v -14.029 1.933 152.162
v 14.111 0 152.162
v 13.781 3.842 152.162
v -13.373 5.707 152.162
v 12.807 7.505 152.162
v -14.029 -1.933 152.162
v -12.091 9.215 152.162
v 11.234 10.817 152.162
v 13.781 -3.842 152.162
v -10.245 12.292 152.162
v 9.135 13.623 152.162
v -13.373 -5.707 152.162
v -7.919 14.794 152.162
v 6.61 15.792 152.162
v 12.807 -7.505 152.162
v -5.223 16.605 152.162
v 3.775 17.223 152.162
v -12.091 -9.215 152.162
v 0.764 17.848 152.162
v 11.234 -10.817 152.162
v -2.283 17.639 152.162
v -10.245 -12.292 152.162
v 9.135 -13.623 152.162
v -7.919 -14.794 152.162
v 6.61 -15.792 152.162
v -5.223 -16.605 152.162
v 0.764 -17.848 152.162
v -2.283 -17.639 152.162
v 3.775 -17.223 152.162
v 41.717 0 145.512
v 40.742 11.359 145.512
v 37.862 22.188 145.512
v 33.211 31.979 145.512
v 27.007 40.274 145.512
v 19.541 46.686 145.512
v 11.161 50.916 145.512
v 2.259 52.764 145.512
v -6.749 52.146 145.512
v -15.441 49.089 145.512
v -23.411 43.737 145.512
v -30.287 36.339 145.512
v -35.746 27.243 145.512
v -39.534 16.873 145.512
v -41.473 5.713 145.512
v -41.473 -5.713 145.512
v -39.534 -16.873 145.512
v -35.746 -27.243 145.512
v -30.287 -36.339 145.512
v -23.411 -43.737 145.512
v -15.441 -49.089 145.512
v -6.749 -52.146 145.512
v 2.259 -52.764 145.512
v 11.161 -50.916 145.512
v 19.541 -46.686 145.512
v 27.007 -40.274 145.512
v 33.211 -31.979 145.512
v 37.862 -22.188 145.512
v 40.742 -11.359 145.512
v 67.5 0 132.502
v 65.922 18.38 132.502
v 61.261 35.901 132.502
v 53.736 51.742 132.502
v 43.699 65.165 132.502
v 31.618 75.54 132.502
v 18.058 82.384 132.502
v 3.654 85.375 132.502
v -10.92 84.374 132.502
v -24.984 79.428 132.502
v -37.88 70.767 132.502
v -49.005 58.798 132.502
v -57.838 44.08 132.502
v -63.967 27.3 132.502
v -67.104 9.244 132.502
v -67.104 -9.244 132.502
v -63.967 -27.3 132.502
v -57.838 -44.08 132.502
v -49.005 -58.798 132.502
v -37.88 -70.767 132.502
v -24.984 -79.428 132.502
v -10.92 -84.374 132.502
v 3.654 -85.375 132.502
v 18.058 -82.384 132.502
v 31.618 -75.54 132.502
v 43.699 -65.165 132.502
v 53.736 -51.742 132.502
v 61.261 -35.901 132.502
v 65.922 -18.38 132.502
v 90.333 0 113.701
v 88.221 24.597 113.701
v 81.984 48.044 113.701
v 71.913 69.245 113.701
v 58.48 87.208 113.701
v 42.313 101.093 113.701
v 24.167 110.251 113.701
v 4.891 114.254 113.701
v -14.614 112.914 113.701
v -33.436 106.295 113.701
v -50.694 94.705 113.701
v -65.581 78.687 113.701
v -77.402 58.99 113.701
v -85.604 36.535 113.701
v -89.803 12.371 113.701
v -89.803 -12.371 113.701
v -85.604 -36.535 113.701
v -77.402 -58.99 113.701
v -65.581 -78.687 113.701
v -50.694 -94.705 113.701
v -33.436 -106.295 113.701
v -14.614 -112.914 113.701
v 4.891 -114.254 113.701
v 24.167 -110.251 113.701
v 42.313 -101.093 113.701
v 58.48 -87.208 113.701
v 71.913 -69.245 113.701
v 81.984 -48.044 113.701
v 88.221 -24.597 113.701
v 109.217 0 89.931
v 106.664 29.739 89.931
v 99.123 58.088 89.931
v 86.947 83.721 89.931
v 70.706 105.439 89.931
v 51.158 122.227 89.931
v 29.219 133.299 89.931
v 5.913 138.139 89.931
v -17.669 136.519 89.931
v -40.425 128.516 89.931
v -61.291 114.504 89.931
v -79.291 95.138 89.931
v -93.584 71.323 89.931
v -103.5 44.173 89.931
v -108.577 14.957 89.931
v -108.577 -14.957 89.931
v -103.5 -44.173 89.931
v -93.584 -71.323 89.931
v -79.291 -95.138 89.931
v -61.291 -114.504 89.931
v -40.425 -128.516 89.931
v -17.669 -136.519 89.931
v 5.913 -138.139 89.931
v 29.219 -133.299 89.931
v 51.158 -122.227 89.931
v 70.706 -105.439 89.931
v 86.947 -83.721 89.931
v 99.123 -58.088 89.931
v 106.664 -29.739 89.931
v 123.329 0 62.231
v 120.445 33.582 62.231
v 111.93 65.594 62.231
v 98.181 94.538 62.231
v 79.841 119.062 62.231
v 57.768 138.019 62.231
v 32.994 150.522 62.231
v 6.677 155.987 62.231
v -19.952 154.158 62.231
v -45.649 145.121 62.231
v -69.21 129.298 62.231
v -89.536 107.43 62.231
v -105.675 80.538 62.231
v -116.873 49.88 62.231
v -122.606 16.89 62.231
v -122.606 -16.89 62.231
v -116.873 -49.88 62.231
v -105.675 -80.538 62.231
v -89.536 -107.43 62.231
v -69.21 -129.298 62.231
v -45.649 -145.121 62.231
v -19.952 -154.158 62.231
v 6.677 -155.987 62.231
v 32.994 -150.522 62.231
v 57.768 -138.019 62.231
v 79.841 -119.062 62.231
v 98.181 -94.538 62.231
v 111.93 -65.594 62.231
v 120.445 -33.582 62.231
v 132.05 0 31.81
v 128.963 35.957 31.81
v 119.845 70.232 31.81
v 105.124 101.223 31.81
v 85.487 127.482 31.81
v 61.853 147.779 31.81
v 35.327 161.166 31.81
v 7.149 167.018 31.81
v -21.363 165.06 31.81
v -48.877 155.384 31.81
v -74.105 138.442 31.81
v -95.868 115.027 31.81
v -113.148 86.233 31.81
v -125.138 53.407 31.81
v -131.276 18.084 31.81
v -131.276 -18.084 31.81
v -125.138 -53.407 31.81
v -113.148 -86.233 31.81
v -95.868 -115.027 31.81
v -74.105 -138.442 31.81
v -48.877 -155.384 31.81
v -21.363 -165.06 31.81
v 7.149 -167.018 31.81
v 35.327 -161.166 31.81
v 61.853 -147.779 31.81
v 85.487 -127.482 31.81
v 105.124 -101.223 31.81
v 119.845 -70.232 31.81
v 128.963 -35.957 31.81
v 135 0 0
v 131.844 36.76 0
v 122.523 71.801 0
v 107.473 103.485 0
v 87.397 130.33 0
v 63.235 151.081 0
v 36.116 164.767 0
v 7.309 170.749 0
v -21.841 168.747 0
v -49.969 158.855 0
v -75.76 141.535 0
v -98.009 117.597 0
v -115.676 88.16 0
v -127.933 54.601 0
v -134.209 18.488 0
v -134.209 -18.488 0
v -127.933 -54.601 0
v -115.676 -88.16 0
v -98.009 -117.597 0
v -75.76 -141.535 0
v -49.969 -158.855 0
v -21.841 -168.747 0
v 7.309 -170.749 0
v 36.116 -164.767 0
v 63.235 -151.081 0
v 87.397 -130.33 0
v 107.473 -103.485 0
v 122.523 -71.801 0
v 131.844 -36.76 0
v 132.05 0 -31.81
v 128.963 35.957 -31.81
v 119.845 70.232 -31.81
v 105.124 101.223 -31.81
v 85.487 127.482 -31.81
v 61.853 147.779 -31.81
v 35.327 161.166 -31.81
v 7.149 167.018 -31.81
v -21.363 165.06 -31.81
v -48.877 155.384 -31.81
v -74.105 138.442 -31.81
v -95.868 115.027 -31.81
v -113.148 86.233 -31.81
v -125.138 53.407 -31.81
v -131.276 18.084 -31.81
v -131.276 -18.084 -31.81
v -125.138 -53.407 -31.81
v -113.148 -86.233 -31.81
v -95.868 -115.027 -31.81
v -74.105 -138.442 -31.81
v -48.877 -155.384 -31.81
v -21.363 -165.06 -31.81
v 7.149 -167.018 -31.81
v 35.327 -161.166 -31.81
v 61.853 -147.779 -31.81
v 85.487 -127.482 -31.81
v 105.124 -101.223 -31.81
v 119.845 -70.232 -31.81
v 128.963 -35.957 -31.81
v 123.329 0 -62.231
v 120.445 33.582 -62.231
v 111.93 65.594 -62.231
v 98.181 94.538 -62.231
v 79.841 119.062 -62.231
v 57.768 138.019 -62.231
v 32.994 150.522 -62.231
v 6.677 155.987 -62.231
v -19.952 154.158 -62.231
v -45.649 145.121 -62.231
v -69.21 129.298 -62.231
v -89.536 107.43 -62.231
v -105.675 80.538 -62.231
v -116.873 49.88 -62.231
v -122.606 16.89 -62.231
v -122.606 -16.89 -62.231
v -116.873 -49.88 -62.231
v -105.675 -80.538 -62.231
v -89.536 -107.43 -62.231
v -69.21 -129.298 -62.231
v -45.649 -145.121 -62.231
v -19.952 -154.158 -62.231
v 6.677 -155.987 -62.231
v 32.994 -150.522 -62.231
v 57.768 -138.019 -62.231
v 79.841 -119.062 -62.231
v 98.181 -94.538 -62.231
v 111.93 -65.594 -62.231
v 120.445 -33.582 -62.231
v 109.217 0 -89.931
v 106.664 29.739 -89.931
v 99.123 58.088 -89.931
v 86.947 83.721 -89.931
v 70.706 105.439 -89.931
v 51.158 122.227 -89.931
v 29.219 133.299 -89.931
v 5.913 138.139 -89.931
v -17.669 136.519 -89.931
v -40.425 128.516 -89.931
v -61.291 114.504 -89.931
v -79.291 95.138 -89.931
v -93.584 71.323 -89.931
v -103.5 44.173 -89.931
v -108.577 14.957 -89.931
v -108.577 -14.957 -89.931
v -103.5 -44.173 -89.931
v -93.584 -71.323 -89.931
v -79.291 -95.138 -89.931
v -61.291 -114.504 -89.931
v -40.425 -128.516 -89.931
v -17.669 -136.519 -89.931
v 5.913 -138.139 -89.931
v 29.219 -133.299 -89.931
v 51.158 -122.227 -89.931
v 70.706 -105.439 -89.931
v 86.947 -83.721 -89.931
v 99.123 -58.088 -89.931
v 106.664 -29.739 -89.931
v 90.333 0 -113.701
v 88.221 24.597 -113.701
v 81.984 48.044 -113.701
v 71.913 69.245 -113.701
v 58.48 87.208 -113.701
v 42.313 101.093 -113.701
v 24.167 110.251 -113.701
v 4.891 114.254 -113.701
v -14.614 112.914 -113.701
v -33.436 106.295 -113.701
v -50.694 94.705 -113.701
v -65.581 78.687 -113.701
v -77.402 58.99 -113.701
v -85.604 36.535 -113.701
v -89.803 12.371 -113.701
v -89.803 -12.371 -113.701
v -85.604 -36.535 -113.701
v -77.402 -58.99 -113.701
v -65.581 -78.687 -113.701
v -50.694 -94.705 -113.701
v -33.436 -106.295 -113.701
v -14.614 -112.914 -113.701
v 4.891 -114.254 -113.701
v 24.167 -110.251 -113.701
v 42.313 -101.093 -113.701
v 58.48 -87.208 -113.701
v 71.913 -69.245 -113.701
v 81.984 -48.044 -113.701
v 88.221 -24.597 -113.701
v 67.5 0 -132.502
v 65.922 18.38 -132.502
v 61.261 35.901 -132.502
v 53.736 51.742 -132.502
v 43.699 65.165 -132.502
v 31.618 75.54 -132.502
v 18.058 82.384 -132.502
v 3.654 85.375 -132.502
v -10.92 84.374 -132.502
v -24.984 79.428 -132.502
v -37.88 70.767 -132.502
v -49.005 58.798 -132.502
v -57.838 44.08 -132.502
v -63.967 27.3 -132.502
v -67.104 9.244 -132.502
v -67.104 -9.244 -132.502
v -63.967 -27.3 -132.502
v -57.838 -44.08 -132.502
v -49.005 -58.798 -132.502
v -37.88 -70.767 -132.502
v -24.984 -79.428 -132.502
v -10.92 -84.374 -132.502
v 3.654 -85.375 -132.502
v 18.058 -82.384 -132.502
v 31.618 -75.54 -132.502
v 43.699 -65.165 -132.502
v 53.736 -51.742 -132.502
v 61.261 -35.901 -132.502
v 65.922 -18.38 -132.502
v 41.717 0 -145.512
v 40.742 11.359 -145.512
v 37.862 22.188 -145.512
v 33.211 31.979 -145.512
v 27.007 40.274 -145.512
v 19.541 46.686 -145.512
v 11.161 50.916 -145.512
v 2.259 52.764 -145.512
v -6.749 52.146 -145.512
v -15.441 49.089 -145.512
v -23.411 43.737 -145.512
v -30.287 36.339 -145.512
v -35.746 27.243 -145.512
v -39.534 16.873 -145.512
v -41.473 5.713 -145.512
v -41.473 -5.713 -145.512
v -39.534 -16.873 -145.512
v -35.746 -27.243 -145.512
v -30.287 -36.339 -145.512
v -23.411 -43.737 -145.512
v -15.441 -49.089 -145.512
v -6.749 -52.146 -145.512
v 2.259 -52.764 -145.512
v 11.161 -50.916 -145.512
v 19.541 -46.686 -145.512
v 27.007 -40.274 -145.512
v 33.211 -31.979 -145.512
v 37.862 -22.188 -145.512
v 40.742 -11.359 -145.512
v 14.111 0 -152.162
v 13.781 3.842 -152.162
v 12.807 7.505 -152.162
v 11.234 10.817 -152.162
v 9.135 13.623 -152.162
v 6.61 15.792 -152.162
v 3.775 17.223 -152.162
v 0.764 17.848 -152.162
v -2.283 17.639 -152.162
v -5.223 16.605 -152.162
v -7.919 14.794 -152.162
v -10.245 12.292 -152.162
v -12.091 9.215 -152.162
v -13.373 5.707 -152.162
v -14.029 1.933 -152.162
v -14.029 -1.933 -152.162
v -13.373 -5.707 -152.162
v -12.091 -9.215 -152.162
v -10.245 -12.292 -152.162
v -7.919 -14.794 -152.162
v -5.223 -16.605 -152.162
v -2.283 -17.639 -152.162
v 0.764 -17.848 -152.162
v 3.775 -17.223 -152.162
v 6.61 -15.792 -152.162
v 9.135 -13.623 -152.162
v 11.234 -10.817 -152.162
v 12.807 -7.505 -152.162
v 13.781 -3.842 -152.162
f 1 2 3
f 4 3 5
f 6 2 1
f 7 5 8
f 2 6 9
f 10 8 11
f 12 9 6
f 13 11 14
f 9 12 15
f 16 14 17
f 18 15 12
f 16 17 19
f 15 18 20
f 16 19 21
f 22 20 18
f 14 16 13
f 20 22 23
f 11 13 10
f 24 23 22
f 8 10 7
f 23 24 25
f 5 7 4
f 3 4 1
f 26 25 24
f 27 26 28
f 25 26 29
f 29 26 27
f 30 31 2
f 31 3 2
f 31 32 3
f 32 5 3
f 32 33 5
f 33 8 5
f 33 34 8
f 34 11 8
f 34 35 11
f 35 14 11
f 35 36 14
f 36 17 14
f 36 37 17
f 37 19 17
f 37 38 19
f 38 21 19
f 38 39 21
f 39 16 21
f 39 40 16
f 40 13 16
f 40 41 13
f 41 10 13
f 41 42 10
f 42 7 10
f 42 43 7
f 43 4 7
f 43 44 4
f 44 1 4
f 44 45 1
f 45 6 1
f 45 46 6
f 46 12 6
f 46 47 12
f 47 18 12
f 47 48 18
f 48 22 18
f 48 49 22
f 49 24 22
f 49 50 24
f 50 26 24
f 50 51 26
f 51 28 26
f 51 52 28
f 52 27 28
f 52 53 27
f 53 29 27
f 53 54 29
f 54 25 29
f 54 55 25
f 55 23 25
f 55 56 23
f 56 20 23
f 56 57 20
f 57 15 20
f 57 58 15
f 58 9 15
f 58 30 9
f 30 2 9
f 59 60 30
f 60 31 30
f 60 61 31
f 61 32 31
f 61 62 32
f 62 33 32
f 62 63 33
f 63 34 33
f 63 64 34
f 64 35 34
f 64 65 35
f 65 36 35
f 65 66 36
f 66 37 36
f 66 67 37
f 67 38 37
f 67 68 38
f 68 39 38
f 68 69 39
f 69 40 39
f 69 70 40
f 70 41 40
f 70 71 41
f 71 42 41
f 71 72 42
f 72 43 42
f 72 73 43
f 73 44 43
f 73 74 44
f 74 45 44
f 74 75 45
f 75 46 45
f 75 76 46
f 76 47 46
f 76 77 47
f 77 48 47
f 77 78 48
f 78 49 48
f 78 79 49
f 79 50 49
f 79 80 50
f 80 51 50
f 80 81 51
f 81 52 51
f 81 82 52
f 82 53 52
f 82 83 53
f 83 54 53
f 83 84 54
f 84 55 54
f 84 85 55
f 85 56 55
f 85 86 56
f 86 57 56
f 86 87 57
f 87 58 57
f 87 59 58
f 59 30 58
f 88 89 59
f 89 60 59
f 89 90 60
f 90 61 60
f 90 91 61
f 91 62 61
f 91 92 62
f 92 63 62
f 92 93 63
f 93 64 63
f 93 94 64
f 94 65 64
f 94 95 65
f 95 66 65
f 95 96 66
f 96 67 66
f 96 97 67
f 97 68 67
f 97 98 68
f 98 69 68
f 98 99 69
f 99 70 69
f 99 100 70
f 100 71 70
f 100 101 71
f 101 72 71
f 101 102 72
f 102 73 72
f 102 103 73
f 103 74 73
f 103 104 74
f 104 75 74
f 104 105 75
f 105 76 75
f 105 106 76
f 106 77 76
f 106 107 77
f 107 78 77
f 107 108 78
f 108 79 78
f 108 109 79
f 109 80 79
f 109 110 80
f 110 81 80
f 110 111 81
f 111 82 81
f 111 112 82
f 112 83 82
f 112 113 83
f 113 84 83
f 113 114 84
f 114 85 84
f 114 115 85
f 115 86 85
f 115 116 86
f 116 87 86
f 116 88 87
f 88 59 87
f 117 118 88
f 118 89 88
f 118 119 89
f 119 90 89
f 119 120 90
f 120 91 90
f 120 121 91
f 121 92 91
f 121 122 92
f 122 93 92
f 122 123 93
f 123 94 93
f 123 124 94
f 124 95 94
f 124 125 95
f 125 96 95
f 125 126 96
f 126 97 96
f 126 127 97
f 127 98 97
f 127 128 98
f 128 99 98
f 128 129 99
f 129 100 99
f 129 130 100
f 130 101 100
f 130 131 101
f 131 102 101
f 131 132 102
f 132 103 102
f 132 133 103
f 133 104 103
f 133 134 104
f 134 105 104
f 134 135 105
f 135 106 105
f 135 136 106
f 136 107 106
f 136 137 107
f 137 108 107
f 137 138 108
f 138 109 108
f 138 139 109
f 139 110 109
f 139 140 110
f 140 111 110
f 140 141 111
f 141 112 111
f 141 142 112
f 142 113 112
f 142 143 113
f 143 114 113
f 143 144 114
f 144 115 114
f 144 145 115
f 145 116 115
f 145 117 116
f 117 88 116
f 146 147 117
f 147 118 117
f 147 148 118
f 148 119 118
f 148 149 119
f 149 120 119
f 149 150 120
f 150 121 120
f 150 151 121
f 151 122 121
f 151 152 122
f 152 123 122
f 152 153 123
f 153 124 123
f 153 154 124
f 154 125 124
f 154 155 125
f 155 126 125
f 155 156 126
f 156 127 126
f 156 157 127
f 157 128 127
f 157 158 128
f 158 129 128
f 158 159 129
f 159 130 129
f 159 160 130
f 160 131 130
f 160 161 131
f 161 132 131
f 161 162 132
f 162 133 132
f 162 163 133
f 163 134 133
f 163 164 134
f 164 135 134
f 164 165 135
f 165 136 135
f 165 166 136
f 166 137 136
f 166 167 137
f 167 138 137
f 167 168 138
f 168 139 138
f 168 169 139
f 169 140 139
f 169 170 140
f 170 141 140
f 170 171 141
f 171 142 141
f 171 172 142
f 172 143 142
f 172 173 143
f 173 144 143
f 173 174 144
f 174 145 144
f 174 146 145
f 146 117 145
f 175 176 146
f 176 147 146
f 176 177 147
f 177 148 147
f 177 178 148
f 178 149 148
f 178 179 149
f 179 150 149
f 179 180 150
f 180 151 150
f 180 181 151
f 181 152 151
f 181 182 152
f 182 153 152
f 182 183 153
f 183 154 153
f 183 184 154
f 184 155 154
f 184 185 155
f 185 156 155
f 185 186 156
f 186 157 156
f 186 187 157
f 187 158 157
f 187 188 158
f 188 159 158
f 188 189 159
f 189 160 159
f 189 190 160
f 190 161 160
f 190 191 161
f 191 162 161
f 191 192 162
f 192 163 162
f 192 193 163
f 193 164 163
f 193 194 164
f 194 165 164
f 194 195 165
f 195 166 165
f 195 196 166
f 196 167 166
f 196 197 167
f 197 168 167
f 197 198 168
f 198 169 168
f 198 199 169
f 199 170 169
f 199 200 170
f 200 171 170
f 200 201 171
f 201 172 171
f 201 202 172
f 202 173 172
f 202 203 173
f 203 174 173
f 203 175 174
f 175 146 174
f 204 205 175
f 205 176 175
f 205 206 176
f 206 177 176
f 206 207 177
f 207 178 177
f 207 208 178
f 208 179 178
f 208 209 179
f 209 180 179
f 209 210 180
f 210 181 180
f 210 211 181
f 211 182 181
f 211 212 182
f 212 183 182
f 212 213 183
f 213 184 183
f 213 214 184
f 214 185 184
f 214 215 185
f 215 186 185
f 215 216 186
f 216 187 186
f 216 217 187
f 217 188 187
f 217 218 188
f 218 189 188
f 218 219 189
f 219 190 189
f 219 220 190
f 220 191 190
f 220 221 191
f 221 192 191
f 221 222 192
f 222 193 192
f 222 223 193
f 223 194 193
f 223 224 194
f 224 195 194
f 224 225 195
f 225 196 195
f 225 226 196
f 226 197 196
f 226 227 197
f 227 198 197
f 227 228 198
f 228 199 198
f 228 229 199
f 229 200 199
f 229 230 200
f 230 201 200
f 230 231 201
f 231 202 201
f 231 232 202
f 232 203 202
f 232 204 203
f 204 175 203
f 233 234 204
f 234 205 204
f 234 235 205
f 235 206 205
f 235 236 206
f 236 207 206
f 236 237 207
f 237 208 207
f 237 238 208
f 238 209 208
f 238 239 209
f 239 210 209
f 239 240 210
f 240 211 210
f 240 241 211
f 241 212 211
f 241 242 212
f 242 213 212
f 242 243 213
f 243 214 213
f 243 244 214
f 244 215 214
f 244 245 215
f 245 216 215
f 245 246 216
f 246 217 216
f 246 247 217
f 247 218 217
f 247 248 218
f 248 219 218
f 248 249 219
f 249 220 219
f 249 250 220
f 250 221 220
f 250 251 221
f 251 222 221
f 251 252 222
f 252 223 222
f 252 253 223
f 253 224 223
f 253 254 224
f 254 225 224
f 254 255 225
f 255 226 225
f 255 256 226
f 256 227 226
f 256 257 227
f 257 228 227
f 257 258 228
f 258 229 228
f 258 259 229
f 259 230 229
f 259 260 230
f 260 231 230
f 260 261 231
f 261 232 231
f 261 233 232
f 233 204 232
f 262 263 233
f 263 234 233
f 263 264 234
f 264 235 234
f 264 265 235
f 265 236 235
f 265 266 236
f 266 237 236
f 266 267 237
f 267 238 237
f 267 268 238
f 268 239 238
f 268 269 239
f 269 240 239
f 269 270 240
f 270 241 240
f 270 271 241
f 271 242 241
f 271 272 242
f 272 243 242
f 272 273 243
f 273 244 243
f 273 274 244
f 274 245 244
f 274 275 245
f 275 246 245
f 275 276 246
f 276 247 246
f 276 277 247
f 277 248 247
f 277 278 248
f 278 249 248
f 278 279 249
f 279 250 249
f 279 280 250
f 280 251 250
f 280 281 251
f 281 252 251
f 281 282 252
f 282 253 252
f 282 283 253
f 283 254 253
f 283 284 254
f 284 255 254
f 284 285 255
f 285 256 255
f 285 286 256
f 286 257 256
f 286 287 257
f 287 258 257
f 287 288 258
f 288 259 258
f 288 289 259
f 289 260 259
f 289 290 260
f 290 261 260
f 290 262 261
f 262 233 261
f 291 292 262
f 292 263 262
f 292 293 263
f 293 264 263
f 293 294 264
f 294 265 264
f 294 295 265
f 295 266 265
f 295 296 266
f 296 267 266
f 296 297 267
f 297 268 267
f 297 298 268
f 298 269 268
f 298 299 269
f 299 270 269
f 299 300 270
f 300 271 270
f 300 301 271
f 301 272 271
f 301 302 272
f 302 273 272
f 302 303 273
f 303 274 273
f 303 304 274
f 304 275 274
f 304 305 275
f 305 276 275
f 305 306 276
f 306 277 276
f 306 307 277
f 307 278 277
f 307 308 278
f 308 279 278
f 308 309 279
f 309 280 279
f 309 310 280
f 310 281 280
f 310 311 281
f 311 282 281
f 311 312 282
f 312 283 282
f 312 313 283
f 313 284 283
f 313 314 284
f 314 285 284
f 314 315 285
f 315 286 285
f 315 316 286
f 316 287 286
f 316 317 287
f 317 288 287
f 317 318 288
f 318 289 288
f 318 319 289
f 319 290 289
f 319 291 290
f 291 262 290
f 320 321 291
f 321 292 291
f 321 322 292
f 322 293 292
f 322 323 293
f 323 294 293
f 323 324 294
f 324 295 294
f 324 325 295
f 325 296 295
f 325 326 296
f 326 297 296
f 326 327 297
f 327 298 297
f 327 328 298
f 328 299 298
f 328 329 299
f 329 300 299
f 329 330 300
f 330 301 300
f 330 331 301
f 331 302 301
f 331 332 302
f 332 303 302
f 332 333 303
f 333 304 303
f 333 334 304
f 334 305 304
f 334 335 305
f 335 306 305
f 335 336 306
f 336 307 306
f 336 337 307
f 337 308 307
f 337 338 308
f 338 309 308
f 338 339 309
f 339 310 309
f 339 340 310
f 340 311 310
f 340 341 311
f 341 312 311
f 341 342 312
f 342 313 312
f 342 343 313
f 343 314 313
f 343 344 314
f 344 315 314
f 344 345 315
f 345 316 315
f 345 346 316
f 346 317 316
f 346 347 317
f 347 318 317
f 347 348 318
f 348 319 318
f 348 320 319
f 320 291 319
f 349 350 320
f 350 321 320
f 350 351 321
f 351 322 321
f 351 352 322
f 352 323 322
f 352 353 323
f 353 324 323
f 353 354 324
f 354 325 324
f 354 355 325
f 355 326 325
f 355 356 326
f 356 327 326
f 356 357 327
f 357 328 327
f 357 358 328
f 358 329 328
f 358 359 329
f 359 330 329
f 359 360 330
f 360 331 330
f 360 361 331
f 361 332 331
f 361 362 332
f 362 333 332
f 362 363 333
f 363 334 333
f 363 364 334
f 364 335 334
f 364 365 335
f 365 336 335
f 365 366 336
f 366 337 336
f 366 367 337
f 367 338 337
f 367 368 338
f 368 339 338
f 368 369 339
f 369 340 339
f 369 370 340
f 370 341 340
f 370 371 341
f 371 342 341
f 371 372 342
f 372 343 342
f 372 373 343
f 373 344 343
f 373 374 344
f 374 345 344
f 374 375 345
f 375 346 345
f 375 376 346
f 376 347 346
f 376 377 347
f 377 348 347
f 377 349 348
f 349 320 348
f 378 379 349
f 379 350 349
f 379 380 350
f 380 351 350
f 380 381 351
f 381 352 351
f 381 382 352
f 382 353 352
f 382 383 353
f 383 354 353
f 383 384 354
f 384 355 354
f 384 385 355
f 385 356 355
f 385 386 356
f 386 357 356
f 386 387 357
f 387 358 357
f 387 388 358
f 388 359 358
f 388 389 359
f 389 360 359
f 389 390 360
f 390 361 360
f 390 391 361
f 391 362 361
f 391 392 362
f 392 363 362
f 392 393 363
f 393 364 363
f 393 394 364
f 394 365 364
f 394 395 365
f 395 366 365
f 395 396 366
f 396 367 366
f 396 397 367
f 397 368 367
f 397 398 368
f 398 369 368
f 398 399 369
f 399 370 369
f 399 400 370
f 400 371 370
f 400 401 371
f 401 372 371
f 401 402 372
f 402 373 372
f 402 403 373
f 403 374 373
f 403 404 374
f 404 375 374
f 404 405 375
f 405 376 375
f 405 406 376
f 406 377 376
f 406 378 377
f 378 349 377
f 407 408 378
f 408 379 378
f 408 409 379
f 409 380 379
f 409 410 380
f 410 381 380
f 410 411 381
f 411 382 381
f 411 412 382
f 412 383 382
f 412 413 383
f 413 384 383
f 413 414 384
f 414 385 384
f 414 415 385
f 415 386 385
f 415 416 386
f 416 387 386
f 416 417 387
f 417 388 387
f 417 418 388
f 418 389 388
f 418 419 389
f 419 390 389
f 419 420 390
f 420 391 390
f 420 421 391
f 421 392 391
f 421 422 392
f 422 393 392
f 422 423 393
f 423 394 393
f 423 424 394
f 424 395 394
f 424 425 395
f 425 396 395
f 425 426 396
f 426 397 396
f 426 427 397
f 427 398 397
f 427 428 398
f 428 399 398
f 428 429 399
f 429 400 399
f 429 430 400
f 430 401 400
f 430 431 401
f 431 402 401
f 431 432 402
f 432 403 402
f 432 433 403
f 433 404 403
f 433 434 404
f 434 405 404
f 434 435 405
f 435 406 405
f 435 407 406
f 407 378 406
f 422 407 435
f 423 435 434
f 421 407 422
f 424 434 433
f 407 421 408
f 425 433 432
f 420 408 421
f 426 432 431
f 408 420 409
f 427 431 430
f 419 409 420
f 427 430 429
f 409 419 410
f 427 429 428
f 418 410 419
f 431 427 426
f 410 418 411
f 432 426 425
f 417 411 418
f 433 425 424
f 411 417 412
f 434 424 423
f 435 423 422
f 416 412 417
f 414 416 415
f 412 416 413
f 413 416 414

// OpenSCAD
// Generated by SolidPython 1.0.1 on 2020-07-29 00:46:52


scale(v = [15, 19, 17]) {
	sphere(r = 9);
}
/***********************************************
*********      SolidPython code:      **********
************************************************
 
# import packages: SolidPython
from solid import *
from solid.utils import *
from itertools import chain, combinations, permutations


class Resize:

    def __init__(self, scad_file):
        self.scad_file = scad_file
        #self.scad_file = import_scad(scad_file)
        # cone/cylinder param:
        self.r1 = 0
        self.r2 = 0
        self.h = 0
        # rectangular prism param:
        self.w = 0
        self.l = 0
        # ellipse param:
        self.r = 0

    # import OpenScad code (file name corresponds to shape)


    # classify shape + parameters
    def assign(self, param1, param2, param3):
        if self.scad_file == 'cone.scad':
            self.r1 = param1
            self.r2 = param2
            self.h = param3
        elif self.scad_file == 'cylinder.scad':
            self.r1 = param1
            self.r2 = param2
            self.h = param3
        elif self.scad_file == 'rectangularPrism.scad':
            self.h = param1
            self.l = param2
            self.w = param3
        else:
            self.r = param1
            self.h = param2

    # resize parameters
    def iterate(self):
        x = range(3, 20, 2)
        i = 1
        if self.scad_file == 'cone.scad':
            tempList = list(permutations(x, 2))
            for temp in tempList:
                param1 = temp[0]
                param2 = temp[1]
                filepath = 'produced_scad_files/' + 'cone' + str(param1) + '_' + str(param2) + '_' + '.scad'
                scad_render_to_file(cylinder(h=param1, r1=param2, r2=0), filepath)

        elif self.scad_file == 'cylinder.scad':
            tempList = list(permutations(x, 3))
            for temp in tempList:
                param1 = temp[0]
                param2 = temp[1]
                filepath = 'produced_scad_files/' + 'cylinder' + str(param1) + '_' + str(param2) + '_' + '.scad'
                scad_render_to_file(cylinder(h=param1, r1=param2, r2=param2), filepath)

        elif self.scad_file == 'rectangularPrism.scad':
            tempList = list(permutations(x, 3))
            for temp in tempList:
                param1 = temp[0]
                param2 = temp[1]
                param3 = temp[2]
                filepath = 'produced_scad_files/' + 'rectangularPrism' + str(param1) + '_' + str(param2) + '_' + str(
                    param3) + '.scad'
                scad_render_to_file(cube(size=(param1, param2, param3)), filepath)

        elif self.scad_file == 'ellipse.scad':
            tempList = list(permutations(x, 4))
            for temp in tempList:
                param1 = temp[0]
                param2 = temp[1]
                param3 = temp[2]
                param4 = temp[3]
                filepath = 'produced_scad_files/' + 'ellipse' + str(param1) + '_' + str(param2) + '_' + str(param3) + '_' + str(param4) + '.scad'
                scad_render_to_file(scale([param1, param2, param3])(sphere(r=param4)), filepath)

    def render_to_scadfile(self):
        scad_render_to_file(scad, 'example.scad') 
 
************************************************/
